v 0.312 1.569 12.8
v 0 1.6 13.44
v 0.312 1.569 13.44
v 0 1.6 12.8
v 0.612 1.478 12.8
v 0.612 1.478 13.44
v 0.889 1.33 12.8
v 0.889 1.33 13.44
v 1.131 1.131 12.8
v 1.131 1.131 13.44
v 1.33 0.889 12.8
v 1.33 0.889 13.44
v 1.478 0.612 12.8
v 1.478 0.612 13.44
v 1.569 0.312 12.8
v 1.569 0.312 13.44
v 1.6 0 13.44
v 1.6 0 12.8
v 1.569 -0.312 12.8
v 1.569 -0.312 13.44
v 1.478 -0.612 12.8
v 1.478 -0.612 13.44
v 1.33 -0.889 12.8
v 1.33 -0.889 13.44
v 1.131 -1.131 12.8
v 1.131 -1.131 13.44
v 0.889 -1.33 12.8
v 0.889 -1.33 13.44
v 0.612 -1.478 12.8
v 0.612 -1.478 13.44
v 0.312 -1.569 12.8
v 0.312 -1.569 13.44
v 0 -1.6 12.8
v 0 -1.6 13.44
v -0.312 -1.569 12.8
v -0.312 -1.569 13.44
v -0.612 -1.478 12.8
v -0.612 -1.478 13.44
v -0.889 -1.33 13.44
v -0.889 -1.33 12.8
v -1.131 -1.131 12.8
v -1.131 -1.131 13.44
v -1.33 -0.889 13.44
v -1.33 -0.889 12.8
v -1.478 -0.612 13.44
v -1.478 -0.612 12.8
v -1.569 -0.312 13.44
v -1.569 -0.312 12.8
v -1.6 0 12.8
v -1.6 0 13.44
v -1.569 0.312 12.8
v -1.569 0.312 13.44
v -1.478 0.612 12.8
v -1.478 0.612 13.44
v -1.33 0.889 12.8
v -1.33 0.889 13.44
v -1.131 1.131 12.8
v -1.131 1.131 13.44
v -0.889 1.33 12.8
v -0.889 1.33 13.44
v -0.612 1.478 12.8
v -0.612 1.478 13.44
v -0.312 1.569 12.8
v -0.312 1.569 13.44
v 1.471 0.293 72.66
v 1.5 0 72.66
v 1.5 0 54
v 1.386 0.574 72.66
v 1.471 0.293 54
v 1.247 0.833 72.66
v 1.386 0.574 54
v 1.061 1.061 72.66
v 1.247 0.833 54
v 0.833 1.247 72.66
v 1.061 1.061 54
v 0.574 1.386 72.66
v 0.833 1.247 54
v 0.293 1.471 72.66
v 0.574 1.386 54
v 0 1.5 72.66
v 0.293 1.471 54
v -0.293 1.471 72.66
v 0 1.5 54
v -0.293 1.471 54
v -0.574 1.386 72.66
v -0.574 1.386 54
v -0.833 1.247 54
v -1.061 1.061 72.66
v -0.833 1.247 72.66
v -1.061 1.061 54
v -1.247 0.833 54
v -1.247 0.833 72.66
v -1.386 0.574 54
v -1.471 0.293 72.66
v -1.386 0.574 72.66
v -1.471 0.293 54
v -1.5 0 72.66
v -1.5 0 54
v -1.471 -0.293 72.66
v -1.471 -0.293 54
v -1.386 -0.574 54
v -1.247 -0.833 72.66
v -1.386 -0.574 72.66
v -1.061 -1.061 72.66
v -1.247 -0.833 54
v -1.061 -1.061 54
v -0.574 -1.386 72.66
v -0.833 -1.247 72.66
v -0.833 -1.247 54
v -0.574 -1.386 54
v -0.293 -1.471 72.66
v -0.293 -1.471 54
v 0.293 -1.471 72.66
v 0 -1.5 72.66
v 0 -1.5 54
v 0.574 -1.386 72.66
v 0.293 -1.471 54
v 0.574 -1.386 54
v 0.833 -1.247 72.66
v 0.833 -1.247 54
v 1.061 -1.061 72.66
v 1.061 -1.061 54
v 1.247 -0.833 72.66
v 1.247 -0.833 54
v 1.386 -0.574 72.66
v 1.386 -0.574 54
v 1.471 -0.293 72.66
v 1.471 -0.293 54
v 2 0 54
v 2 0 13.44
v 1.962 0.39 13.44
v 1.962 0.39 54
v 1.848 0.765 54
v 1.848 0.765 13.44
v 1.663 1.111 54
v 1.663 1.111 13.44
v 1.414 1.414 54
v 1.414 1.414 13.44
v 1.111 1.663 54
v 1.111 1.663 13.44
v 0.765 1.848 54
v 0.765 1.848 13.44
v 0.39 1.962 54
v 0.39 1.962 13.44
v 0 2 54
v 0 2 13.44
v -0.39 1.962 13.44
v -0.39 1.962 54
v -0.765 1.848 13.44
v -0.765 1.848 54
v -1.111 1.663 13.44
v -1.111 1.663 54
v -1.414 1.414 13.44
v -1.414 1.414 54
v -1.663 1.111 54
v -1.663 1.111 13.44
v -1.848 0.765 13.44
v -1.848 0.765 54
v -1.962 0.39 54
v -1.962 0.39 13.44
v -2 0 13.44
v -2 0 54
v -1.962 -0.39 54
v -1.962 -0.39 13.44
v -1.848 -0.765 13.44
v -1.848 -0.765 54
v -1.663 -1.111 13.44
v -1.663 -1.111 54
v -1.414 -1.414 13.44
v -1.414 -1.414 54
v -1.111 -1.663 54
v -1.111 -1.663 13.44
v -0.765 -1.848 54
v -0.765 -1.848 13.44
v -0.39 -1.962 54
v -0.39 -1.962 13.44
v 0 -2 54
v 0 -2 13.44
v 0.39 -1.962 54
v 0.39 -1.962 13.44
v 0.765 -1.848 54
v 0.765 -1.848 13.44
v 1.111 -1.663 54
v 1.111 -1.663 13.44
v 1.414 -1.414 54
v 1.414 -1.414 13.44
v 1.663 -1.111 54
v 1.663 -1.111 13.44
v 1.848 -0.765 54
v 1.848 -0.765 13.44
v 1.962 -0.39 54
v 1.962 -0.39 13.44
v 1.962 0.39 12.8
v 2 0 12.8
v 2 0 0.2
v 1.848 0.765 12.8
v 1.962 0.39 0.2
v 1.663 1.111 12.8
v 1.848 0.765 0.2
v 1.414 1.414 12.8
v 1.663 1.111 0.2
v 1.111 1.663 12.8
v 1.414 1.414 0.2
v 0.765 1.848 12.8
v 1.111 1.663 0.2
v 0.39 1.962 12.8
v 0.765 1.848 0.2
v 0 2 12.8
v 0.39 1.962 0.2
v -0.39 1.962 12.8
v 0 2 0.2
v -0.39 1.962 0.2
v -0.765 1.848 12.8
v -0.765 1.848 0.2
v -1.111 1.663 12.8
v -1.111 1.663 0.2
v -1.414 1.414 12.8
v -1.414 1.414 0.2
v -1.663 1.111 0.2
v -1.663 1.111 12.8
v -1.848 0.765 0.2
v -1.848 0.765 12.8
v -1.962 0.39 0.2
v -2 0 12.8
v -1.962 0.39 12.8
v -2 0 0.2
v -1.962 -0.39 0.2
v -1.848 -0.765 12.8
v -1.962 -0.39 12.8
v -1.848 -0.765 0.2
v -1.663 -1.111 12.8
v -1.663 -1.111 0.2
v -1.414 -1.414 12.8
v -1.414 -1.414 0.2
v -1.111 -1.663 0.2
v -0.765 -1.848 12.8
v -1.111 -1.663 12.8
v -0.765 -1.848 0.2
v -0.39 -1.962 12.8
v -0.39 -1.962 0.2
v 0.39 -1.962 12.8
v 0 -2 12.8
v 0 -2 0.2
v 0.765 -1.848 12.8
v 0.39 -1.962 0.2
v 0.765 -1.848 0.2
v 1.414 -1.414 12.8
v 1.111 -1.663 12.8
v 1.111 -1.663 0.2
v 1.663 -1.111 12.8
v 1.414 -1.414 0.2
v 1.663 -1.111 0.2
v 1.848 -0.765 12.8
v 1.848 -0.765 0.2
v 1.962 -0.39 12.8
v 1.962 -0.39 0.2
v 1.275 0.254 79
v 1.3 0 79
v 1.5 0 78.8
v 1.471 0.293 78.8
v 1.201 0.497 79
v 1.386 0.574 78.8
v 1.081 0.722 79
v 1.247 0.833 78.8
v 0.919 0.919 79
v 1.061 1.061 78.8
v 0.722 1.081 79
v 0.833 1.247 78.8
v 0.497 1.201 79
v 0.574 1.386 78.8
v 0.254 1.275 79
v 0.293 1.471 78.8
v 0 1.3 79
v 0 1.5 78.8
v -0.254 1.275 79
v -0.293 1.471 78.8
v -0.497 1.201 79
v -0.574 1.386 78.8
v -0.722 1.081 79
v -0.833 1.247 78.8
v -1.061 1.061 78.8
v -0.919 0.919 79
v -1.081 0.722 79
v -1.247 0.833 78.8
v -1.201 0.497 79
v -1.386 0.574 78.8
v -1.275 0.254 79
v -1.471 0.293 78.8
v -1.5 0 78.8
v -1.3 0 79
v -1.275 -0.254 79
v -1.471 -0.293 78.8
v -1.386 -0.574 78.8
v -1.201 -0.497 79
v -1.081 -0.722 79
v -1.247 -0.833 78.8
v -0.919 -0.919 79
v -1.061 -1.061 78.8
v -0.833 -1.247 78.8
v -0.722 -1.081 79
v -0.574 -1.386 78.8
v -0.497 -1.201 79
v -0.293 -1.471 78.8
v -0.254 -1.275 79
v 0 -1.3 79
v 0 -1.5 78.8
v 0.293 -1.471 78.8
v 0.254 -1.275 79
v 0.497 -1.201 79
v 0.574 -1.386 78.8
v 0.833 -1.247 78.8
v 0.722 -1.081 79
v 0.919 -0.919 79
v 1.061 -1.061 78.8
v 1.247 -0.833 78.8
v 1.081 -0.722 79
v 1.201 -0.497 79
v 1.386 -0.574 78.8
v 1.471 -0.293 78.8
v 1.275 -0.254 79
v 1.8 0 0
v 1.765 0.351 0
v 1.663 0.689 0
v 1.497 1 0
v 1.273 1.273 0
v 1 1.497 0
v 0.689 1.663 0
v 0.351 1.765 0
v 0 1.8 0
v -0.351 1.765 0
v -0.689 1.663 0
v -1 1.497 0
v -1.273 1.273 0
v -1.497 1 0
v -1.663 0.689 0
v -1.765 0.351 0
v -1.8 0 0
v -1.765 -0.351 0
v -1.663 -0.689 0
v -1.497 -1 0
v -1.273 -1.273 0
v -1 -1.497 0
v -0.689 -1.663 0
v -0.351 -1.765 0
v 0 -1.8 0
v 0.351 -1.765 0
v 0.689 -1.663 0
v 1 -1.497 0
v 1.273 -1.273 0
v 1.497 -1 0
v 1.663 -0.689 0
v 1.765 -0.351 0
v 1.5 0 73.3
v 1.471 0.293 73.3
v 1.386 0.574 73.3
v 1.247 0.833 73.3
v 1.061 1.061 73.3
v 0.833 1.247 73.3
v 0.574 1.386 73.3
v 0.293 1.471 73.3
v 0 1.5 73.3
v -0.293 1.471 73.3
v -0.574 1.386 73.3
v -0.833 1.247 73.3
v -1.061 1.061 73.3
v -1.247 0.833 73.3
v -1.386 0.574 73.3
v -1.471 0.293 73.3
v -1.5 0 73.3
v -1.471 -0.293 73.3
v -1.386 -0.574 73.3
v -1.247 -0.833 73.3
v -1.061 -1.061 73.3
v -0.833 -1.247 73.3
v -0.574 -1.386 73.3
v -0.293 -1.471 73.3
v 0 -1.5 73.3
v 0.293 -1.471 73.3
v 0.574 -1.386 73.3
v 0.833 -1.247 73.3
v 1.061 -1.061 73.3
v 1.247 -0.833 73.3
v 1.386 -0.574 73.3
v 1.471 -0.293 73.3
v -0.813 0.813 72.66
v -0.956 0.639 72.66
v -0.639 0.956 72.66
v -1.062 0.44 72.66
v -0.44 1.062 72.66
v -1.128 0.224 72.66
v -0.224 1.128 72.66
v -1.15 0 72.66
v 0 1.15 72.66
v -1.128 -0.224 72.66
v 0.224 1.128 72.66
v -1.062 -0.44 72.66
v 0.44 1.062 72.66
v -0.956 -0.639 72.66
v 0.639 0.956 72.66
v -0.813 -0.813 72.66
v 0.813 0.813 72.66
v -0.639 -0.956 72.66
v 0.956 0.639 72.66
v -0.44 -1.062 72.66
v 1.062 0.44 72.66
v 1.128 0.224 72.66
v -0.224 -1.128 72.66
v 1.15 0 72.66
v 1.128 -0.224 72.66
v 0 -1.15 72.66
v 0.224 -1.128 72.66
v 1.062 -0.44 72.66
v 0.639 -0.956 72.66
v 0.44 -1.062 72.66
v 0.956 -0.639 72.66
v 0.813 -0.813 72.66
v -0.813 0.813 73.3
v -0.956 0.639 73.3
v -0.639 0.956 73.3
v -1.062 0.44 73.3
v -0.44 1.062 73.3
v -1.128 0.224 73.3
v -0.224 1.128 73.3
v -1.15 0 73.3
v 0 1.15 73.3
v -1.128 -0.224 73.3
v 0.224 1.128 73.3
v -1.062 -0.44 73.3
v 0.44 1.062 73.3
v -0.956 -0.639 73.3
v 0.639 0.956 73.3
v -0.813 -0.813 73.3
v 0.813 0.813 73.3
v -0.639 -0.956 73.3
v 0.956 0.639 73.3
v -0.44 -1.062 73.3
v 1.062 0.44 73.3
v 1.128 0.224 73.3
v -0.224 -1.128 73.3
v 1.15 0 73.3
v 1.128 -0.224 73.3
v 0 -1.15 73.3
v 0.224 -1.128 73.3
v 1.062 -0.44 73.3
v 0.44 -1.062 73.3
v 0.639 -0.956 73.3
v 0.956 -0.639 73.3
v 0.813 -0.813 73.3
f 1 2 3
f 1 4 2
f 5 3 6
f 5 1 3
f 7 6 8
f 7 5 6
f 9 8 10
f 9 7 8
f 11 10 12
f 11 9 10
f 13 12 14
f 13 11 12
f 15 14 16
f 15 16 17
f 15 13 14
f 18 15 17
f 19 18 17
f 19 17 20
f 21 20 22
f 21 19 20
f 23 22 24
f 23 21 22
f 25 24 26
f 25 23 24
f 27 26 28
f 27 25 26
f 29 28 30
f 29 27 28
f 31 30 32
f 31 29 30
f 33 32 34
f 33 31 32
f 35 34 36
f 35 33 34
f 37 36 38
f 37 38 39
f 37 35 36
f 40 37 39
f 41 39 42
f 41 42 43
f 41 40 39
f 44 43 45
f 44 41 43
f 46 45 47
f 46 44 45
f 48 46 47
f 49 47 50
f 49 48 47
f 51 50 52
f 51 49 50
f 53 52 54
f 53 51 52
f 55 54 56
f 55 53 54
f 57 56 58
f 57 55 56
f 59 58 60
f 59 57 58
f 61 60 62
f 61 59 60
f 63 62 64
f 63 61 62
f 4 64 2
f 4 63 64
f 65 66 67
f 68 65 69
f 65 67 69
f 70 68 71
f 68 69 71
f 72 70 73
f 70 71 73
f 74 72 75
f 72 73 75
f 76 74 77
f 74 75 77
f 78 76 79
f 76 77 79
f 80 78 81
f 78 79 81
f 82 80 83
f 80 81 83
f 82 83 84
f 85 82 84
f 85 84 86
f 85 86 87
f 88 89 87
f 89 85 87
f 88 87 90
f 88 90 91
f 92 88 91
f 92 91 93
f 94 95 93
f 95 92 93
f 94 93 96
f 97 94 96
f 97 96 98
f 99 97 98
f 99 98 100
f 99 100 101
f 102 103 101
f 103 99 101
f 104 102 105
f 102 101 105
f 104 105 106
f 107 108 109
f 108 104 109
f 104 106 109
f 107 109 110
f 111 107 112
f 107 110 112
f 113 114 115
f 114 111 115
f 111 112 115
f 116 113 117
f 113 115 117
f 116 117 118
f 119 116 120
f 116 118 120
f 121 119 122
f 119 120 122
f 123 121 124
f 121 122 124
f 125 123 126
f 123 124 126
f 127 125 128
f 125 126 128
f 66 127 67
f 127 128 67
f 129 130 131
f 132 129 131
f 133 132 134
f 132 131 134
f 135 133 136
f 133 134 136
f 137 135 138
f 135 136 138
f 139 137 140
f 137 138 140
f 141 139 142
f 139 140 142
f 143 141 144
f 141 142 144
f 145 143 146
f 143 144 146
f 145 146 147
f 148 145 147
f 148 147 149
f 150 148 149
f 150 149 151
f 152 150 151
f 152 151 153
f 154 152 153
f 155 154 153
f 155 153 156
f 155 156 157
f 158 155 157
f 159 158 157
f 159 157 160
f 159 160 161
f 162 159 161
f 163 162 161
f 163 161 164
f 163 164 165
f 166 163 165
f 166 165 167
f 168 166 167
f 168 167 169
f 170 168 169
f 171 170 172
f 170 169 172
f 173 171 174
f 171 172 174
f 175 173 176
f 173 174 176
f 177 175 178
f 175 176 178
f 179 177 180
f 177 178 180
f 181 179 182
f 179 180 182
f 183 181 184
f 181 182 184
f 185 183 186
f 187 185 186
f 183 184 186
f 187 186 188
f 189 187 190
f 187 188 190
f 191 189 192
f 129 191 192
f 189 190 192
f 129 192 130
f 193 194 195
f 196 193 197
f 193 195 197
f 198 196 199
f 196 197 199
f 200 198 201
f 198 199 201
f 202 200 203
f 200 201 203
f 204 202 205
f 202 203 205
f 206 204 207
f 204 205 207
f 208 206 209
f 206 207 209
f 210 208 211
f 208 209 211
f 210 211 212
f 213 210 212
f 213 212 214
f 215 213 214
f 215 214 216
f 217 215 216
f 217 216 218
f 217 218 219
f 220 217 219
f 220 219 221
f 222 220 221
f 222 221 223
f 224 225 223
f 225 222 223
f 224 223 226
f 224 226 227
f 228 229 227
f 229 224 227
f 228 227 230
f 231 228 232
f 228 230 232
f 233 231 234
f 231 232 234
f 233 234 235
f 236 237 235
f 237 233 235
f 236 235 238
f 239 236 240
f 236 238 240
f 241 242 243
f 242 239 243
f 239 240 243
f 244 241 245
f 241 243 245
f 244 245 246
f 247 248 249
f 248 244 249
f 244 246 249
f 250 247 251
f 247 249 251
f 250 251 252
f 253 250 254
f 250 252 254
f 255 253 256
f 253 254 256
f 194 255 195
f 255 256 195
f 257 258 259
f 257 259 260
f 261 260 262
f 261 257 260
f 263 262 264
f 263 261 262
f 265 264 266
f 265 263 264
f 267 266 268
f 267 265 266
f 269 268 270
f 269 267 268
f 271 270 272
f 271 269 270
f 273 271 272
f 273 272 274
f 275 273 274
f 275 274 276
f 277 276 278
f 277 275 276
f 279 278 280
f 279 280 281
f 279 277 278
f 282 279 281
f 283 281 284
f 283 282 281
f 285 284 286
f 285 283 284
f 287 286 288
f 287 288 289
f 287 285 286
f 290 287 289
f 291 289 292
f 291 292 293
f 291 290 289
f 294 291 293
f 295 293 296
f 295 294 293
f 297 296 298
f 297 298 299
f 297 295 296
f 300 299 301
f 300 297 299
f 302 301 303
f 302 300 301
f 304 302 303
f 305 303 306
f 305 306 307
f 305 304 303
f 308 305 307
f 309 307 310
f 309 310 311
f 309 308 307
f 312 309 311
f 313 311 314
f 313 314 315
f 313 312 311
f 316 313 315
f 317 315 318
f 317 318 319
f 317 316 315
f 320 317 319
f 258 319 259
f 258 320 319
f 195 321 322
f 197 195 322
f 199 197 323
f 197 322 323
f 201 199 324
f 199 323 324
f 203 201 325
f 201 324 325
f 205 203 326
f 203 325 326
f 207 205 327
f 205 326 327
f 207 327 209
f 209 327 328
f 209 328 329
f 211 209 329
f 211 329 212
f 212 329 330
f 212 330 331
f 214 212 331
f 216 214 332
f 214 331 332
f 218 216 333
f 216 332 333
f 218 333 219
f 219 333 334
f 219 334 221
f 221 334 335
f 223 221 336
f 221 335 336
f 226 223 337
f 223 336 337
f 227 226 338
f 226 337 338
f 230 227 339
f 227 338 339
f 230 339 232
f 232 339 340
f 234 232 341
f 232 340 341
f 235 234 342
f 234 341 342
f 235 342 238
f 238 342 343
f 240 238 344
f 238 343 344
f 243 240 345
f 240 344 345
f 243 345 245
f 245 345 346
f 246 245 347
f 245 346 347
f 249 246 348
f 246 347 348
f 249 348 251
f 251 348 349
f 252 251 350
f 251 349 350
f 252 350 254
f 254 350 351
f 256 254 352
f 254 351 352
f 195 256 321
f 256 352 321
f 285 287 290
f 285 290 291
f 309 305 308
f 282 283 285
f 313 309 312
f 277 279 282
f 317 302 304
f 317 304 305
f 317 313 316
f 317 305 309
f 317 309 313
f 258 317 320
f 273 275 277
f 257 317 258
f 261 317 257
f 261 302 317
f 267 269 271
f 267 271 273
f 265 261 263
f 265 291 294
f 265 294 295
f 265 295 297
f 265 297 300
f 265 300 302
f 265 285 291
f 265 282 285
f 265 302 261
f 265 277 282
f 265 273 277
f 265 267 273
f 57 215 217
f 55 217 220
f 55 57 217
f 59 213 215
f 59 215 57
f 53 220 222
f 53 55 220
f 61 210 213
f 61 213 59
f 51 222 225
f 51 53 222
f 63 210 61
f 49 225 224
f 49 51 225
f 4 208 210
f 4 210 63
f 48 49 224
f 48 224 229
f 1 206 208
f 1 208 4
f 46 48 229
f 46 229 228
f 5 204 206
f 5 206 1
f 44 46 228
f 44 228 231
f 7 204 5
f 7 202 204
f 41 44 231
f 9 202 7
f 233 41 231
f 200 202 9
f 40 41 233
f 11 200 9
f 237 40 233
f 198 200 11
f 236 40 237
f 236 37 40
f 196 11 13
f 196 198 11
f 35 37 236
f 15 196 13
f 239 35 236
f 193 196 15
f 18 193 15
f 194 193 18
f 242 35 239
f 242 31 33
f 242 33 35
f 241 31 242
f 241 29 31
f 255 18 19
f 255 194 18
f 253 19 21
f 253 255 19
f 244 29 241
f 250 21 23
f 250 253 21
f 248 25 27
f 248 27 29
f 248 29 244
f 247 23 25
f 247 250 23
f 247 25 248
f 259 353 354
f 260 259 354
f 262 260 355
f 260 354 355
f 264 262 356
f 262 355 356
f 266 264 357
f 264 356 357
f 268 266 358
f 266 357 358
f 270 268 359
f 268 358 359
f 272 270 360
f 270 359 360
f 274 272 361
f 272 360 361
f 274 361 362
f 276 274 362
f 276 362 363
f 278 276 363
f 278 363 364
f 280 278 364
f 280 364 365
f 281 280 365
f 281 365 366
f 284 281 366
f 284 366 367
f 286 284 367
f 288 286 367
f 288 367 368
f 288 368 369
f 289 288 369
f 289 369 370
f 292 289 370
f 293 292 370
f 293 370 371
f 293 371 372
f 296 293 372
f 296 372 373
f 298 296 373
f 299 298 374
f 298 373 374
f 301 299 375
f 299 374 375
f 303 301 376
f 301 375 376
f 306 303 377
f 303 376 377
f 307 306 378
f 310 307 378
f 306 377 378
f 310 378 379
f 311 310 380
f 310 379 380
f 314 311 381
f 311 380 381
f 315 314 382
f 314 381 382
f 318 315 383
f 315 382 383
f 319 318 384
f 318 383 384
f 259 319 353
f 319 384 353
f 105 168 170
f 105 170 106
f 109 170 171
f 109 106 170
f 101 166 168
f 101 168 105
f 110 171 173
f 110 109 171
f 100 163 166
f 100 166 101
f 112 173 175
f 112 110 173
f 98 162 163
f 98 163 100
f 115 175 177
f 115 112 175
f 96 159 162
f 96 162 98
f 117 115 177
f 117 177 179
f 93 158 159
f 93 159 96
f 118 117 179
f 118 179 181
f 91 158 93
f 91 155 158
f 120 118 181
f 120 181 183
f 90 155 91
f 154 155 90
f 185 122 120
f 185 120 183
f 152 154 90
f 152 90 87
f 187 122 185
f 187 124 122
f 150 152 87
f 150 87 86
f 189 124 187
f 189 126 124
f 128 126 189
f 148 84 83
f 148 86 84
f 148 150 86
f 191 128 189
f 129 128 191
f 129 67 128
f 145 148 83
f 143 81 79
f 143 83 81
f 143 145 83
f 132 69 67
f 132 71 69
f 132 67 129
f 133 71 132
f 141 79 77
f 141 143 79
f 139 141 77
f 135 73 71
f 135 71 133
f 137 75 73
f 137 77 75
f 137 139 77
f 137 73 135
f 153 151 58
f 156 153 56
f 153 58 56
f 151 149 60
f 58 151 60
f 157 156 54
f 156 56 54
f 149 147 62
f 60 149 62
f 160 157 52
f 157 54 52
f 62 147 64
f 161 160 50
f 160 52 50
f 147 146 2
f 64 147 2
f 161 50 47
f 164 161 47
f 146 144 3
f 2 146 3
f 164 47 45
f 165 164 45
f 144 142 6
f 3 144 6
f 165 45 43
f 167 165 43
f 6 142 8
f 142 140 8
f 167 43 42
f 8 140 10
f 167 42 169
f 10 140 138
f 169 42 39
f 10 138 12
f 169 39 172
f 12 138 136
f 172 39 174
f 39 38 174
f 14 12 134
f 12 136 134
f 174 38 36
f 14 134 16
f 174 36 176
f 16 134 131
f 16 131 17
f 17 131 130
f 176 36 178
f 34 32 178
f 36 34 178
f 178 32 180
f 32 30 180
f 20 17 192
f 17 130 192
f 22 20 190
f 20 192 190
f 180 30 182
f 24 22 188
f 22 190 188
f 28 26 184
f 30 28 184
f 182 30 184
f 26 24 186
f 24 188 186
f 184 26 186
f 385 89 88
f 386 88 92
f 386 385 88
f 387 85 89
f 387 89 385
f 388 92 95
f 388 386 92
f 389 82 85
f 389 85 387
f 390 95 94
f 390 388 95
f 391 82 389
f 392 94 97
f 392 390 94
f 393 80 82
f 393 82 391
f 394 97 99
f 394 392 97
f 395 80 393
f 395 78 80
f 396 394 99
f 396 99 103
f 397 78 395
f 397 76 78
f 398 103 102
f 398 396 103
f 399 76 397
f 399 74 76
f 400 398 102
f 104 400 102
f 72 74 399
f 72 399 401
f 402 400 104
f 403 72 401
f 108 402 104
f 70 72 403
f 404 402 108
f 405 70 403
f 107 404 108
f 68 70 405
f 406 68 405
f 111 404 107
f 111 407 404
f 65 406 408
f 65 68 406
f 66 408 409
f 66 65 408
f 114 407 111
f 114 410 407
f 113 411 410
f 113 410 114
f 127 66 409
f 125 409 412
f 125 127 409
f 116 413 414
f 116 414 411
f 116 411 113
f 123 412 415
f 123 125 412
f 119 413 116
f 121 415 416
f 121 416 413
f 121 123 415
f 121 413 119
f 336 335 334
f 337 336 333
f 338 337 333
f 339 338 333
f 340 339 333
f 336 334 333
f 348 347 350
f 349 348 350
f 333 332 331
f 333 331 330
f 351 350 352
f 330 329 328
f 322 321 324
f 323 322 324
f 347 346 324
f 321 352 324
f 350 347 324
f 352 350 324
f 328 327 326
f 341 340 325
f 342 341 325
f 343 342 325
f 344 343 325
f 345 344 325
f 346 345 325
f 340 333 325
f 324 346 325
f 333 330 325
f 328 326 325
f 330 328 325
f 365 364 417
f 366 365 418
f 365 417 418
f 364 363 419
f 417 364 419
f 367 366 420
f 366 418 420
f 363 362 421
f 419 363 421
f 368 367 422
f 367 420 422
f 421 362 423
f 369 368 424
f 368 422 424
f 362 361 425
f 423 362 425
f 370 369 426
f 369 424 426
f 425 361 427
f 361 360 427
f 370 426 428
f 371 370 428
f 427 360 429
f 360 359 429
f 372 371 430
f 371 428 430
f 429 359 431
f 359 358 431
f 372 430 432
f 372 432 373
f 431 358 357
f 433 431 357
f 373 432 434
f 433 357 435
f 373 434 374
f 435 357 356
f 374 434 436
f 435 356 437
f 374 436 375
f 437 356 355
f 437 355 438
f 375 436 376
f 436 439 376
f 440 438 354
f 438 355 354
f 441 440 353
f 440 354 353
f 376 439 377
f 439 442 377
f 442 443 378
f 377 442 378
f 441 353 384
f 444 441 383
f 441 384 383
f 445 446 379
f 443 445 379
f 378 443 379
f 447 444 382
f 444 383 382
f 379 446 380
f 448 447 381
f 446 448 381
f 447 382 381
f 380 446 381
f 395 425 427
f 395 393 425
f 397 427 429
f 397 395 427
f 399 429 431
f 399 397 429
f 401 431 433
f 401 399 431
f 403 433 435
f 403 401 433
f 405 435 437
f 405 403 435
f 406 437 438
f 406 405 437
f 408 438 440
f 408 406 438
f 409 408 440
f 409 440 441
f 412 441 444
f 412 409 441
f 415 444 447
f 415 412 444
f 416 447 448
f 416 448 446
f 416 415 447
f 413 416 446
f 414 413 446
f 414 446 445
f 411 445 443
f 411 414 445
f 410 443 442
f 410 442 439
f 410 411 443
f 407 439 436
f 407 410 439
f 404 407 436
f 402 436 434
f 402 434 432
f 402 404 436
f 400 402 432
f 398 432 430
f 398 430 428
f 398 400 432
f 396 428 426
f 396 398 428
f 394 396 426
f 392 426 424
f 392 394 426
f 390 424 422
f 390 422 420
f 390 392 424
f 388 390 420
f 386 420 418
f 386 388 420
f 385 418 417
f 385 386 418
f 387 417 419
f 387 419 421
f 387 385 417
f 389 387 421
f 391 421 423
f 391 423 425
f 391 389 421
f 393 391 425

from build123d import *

# Parameters (mm, degrees)
ESQUISSE1_R          = 2
BASE_EXTRUSION_DEPTH = 54
ESQUISSE2_R          = 1.5
BOSS_EXTRU_1_DEPTH   = 25
CHANFREIN1_SIZE      = 0.2
ESQUISSE3_W          = 0.64
ESQUISSE3_H          = 2.403474903
ESQUISSE3_H_2        = 2.734022734


with BuildPart() as part:
    # Esquisse1 → Base-Extrusion (new body)
    with BuildSketch(Plane.XY):
        Circle(ESQUISSE1_R)
    extrude(amount=BASE_EXTRUSION_DEPTH)

    # Esquisse2 → Boss.-Extru.1 (add)
    with BuildSketch(Plane.XY.offset(54)):
        Circle(ESQUISSE2_R)
    extrude(amount=BOSS_EXTRU_1_DEPTH)

    # Chanfrein1
    chanfrein1_edges = [part.edges().sort_by_distance(p)[0] for p in [
        (-2, 0, 0),
        (-1.5, 0, 79),
    ]]
    chamfer(chanfrein1_edges, length=CHANFREIN1_SIZE)

    # Esquisse3 → Enlèvement de matière-Révolution1 (revolve, cut)
    with BuildSketch(Plane(origin=(0, 0, 0), x_dir=(0, 0, -1), z_dir=(1, 0, 0))):
        with Locations((-13.12, 2.801737452)):
            Rectangle(ESQUISSE3_W, ESQUISSE3_H)
        with Locations((-72.98, 2.517011367)):
            Rectangle(ESQUISSE3_W, ESQUISSE3_H_2)
    revolve(axis=Axis((0, 0, 0), (0, 0, -1)), mode=Mode.SUBTRACT)


solid = part.part
